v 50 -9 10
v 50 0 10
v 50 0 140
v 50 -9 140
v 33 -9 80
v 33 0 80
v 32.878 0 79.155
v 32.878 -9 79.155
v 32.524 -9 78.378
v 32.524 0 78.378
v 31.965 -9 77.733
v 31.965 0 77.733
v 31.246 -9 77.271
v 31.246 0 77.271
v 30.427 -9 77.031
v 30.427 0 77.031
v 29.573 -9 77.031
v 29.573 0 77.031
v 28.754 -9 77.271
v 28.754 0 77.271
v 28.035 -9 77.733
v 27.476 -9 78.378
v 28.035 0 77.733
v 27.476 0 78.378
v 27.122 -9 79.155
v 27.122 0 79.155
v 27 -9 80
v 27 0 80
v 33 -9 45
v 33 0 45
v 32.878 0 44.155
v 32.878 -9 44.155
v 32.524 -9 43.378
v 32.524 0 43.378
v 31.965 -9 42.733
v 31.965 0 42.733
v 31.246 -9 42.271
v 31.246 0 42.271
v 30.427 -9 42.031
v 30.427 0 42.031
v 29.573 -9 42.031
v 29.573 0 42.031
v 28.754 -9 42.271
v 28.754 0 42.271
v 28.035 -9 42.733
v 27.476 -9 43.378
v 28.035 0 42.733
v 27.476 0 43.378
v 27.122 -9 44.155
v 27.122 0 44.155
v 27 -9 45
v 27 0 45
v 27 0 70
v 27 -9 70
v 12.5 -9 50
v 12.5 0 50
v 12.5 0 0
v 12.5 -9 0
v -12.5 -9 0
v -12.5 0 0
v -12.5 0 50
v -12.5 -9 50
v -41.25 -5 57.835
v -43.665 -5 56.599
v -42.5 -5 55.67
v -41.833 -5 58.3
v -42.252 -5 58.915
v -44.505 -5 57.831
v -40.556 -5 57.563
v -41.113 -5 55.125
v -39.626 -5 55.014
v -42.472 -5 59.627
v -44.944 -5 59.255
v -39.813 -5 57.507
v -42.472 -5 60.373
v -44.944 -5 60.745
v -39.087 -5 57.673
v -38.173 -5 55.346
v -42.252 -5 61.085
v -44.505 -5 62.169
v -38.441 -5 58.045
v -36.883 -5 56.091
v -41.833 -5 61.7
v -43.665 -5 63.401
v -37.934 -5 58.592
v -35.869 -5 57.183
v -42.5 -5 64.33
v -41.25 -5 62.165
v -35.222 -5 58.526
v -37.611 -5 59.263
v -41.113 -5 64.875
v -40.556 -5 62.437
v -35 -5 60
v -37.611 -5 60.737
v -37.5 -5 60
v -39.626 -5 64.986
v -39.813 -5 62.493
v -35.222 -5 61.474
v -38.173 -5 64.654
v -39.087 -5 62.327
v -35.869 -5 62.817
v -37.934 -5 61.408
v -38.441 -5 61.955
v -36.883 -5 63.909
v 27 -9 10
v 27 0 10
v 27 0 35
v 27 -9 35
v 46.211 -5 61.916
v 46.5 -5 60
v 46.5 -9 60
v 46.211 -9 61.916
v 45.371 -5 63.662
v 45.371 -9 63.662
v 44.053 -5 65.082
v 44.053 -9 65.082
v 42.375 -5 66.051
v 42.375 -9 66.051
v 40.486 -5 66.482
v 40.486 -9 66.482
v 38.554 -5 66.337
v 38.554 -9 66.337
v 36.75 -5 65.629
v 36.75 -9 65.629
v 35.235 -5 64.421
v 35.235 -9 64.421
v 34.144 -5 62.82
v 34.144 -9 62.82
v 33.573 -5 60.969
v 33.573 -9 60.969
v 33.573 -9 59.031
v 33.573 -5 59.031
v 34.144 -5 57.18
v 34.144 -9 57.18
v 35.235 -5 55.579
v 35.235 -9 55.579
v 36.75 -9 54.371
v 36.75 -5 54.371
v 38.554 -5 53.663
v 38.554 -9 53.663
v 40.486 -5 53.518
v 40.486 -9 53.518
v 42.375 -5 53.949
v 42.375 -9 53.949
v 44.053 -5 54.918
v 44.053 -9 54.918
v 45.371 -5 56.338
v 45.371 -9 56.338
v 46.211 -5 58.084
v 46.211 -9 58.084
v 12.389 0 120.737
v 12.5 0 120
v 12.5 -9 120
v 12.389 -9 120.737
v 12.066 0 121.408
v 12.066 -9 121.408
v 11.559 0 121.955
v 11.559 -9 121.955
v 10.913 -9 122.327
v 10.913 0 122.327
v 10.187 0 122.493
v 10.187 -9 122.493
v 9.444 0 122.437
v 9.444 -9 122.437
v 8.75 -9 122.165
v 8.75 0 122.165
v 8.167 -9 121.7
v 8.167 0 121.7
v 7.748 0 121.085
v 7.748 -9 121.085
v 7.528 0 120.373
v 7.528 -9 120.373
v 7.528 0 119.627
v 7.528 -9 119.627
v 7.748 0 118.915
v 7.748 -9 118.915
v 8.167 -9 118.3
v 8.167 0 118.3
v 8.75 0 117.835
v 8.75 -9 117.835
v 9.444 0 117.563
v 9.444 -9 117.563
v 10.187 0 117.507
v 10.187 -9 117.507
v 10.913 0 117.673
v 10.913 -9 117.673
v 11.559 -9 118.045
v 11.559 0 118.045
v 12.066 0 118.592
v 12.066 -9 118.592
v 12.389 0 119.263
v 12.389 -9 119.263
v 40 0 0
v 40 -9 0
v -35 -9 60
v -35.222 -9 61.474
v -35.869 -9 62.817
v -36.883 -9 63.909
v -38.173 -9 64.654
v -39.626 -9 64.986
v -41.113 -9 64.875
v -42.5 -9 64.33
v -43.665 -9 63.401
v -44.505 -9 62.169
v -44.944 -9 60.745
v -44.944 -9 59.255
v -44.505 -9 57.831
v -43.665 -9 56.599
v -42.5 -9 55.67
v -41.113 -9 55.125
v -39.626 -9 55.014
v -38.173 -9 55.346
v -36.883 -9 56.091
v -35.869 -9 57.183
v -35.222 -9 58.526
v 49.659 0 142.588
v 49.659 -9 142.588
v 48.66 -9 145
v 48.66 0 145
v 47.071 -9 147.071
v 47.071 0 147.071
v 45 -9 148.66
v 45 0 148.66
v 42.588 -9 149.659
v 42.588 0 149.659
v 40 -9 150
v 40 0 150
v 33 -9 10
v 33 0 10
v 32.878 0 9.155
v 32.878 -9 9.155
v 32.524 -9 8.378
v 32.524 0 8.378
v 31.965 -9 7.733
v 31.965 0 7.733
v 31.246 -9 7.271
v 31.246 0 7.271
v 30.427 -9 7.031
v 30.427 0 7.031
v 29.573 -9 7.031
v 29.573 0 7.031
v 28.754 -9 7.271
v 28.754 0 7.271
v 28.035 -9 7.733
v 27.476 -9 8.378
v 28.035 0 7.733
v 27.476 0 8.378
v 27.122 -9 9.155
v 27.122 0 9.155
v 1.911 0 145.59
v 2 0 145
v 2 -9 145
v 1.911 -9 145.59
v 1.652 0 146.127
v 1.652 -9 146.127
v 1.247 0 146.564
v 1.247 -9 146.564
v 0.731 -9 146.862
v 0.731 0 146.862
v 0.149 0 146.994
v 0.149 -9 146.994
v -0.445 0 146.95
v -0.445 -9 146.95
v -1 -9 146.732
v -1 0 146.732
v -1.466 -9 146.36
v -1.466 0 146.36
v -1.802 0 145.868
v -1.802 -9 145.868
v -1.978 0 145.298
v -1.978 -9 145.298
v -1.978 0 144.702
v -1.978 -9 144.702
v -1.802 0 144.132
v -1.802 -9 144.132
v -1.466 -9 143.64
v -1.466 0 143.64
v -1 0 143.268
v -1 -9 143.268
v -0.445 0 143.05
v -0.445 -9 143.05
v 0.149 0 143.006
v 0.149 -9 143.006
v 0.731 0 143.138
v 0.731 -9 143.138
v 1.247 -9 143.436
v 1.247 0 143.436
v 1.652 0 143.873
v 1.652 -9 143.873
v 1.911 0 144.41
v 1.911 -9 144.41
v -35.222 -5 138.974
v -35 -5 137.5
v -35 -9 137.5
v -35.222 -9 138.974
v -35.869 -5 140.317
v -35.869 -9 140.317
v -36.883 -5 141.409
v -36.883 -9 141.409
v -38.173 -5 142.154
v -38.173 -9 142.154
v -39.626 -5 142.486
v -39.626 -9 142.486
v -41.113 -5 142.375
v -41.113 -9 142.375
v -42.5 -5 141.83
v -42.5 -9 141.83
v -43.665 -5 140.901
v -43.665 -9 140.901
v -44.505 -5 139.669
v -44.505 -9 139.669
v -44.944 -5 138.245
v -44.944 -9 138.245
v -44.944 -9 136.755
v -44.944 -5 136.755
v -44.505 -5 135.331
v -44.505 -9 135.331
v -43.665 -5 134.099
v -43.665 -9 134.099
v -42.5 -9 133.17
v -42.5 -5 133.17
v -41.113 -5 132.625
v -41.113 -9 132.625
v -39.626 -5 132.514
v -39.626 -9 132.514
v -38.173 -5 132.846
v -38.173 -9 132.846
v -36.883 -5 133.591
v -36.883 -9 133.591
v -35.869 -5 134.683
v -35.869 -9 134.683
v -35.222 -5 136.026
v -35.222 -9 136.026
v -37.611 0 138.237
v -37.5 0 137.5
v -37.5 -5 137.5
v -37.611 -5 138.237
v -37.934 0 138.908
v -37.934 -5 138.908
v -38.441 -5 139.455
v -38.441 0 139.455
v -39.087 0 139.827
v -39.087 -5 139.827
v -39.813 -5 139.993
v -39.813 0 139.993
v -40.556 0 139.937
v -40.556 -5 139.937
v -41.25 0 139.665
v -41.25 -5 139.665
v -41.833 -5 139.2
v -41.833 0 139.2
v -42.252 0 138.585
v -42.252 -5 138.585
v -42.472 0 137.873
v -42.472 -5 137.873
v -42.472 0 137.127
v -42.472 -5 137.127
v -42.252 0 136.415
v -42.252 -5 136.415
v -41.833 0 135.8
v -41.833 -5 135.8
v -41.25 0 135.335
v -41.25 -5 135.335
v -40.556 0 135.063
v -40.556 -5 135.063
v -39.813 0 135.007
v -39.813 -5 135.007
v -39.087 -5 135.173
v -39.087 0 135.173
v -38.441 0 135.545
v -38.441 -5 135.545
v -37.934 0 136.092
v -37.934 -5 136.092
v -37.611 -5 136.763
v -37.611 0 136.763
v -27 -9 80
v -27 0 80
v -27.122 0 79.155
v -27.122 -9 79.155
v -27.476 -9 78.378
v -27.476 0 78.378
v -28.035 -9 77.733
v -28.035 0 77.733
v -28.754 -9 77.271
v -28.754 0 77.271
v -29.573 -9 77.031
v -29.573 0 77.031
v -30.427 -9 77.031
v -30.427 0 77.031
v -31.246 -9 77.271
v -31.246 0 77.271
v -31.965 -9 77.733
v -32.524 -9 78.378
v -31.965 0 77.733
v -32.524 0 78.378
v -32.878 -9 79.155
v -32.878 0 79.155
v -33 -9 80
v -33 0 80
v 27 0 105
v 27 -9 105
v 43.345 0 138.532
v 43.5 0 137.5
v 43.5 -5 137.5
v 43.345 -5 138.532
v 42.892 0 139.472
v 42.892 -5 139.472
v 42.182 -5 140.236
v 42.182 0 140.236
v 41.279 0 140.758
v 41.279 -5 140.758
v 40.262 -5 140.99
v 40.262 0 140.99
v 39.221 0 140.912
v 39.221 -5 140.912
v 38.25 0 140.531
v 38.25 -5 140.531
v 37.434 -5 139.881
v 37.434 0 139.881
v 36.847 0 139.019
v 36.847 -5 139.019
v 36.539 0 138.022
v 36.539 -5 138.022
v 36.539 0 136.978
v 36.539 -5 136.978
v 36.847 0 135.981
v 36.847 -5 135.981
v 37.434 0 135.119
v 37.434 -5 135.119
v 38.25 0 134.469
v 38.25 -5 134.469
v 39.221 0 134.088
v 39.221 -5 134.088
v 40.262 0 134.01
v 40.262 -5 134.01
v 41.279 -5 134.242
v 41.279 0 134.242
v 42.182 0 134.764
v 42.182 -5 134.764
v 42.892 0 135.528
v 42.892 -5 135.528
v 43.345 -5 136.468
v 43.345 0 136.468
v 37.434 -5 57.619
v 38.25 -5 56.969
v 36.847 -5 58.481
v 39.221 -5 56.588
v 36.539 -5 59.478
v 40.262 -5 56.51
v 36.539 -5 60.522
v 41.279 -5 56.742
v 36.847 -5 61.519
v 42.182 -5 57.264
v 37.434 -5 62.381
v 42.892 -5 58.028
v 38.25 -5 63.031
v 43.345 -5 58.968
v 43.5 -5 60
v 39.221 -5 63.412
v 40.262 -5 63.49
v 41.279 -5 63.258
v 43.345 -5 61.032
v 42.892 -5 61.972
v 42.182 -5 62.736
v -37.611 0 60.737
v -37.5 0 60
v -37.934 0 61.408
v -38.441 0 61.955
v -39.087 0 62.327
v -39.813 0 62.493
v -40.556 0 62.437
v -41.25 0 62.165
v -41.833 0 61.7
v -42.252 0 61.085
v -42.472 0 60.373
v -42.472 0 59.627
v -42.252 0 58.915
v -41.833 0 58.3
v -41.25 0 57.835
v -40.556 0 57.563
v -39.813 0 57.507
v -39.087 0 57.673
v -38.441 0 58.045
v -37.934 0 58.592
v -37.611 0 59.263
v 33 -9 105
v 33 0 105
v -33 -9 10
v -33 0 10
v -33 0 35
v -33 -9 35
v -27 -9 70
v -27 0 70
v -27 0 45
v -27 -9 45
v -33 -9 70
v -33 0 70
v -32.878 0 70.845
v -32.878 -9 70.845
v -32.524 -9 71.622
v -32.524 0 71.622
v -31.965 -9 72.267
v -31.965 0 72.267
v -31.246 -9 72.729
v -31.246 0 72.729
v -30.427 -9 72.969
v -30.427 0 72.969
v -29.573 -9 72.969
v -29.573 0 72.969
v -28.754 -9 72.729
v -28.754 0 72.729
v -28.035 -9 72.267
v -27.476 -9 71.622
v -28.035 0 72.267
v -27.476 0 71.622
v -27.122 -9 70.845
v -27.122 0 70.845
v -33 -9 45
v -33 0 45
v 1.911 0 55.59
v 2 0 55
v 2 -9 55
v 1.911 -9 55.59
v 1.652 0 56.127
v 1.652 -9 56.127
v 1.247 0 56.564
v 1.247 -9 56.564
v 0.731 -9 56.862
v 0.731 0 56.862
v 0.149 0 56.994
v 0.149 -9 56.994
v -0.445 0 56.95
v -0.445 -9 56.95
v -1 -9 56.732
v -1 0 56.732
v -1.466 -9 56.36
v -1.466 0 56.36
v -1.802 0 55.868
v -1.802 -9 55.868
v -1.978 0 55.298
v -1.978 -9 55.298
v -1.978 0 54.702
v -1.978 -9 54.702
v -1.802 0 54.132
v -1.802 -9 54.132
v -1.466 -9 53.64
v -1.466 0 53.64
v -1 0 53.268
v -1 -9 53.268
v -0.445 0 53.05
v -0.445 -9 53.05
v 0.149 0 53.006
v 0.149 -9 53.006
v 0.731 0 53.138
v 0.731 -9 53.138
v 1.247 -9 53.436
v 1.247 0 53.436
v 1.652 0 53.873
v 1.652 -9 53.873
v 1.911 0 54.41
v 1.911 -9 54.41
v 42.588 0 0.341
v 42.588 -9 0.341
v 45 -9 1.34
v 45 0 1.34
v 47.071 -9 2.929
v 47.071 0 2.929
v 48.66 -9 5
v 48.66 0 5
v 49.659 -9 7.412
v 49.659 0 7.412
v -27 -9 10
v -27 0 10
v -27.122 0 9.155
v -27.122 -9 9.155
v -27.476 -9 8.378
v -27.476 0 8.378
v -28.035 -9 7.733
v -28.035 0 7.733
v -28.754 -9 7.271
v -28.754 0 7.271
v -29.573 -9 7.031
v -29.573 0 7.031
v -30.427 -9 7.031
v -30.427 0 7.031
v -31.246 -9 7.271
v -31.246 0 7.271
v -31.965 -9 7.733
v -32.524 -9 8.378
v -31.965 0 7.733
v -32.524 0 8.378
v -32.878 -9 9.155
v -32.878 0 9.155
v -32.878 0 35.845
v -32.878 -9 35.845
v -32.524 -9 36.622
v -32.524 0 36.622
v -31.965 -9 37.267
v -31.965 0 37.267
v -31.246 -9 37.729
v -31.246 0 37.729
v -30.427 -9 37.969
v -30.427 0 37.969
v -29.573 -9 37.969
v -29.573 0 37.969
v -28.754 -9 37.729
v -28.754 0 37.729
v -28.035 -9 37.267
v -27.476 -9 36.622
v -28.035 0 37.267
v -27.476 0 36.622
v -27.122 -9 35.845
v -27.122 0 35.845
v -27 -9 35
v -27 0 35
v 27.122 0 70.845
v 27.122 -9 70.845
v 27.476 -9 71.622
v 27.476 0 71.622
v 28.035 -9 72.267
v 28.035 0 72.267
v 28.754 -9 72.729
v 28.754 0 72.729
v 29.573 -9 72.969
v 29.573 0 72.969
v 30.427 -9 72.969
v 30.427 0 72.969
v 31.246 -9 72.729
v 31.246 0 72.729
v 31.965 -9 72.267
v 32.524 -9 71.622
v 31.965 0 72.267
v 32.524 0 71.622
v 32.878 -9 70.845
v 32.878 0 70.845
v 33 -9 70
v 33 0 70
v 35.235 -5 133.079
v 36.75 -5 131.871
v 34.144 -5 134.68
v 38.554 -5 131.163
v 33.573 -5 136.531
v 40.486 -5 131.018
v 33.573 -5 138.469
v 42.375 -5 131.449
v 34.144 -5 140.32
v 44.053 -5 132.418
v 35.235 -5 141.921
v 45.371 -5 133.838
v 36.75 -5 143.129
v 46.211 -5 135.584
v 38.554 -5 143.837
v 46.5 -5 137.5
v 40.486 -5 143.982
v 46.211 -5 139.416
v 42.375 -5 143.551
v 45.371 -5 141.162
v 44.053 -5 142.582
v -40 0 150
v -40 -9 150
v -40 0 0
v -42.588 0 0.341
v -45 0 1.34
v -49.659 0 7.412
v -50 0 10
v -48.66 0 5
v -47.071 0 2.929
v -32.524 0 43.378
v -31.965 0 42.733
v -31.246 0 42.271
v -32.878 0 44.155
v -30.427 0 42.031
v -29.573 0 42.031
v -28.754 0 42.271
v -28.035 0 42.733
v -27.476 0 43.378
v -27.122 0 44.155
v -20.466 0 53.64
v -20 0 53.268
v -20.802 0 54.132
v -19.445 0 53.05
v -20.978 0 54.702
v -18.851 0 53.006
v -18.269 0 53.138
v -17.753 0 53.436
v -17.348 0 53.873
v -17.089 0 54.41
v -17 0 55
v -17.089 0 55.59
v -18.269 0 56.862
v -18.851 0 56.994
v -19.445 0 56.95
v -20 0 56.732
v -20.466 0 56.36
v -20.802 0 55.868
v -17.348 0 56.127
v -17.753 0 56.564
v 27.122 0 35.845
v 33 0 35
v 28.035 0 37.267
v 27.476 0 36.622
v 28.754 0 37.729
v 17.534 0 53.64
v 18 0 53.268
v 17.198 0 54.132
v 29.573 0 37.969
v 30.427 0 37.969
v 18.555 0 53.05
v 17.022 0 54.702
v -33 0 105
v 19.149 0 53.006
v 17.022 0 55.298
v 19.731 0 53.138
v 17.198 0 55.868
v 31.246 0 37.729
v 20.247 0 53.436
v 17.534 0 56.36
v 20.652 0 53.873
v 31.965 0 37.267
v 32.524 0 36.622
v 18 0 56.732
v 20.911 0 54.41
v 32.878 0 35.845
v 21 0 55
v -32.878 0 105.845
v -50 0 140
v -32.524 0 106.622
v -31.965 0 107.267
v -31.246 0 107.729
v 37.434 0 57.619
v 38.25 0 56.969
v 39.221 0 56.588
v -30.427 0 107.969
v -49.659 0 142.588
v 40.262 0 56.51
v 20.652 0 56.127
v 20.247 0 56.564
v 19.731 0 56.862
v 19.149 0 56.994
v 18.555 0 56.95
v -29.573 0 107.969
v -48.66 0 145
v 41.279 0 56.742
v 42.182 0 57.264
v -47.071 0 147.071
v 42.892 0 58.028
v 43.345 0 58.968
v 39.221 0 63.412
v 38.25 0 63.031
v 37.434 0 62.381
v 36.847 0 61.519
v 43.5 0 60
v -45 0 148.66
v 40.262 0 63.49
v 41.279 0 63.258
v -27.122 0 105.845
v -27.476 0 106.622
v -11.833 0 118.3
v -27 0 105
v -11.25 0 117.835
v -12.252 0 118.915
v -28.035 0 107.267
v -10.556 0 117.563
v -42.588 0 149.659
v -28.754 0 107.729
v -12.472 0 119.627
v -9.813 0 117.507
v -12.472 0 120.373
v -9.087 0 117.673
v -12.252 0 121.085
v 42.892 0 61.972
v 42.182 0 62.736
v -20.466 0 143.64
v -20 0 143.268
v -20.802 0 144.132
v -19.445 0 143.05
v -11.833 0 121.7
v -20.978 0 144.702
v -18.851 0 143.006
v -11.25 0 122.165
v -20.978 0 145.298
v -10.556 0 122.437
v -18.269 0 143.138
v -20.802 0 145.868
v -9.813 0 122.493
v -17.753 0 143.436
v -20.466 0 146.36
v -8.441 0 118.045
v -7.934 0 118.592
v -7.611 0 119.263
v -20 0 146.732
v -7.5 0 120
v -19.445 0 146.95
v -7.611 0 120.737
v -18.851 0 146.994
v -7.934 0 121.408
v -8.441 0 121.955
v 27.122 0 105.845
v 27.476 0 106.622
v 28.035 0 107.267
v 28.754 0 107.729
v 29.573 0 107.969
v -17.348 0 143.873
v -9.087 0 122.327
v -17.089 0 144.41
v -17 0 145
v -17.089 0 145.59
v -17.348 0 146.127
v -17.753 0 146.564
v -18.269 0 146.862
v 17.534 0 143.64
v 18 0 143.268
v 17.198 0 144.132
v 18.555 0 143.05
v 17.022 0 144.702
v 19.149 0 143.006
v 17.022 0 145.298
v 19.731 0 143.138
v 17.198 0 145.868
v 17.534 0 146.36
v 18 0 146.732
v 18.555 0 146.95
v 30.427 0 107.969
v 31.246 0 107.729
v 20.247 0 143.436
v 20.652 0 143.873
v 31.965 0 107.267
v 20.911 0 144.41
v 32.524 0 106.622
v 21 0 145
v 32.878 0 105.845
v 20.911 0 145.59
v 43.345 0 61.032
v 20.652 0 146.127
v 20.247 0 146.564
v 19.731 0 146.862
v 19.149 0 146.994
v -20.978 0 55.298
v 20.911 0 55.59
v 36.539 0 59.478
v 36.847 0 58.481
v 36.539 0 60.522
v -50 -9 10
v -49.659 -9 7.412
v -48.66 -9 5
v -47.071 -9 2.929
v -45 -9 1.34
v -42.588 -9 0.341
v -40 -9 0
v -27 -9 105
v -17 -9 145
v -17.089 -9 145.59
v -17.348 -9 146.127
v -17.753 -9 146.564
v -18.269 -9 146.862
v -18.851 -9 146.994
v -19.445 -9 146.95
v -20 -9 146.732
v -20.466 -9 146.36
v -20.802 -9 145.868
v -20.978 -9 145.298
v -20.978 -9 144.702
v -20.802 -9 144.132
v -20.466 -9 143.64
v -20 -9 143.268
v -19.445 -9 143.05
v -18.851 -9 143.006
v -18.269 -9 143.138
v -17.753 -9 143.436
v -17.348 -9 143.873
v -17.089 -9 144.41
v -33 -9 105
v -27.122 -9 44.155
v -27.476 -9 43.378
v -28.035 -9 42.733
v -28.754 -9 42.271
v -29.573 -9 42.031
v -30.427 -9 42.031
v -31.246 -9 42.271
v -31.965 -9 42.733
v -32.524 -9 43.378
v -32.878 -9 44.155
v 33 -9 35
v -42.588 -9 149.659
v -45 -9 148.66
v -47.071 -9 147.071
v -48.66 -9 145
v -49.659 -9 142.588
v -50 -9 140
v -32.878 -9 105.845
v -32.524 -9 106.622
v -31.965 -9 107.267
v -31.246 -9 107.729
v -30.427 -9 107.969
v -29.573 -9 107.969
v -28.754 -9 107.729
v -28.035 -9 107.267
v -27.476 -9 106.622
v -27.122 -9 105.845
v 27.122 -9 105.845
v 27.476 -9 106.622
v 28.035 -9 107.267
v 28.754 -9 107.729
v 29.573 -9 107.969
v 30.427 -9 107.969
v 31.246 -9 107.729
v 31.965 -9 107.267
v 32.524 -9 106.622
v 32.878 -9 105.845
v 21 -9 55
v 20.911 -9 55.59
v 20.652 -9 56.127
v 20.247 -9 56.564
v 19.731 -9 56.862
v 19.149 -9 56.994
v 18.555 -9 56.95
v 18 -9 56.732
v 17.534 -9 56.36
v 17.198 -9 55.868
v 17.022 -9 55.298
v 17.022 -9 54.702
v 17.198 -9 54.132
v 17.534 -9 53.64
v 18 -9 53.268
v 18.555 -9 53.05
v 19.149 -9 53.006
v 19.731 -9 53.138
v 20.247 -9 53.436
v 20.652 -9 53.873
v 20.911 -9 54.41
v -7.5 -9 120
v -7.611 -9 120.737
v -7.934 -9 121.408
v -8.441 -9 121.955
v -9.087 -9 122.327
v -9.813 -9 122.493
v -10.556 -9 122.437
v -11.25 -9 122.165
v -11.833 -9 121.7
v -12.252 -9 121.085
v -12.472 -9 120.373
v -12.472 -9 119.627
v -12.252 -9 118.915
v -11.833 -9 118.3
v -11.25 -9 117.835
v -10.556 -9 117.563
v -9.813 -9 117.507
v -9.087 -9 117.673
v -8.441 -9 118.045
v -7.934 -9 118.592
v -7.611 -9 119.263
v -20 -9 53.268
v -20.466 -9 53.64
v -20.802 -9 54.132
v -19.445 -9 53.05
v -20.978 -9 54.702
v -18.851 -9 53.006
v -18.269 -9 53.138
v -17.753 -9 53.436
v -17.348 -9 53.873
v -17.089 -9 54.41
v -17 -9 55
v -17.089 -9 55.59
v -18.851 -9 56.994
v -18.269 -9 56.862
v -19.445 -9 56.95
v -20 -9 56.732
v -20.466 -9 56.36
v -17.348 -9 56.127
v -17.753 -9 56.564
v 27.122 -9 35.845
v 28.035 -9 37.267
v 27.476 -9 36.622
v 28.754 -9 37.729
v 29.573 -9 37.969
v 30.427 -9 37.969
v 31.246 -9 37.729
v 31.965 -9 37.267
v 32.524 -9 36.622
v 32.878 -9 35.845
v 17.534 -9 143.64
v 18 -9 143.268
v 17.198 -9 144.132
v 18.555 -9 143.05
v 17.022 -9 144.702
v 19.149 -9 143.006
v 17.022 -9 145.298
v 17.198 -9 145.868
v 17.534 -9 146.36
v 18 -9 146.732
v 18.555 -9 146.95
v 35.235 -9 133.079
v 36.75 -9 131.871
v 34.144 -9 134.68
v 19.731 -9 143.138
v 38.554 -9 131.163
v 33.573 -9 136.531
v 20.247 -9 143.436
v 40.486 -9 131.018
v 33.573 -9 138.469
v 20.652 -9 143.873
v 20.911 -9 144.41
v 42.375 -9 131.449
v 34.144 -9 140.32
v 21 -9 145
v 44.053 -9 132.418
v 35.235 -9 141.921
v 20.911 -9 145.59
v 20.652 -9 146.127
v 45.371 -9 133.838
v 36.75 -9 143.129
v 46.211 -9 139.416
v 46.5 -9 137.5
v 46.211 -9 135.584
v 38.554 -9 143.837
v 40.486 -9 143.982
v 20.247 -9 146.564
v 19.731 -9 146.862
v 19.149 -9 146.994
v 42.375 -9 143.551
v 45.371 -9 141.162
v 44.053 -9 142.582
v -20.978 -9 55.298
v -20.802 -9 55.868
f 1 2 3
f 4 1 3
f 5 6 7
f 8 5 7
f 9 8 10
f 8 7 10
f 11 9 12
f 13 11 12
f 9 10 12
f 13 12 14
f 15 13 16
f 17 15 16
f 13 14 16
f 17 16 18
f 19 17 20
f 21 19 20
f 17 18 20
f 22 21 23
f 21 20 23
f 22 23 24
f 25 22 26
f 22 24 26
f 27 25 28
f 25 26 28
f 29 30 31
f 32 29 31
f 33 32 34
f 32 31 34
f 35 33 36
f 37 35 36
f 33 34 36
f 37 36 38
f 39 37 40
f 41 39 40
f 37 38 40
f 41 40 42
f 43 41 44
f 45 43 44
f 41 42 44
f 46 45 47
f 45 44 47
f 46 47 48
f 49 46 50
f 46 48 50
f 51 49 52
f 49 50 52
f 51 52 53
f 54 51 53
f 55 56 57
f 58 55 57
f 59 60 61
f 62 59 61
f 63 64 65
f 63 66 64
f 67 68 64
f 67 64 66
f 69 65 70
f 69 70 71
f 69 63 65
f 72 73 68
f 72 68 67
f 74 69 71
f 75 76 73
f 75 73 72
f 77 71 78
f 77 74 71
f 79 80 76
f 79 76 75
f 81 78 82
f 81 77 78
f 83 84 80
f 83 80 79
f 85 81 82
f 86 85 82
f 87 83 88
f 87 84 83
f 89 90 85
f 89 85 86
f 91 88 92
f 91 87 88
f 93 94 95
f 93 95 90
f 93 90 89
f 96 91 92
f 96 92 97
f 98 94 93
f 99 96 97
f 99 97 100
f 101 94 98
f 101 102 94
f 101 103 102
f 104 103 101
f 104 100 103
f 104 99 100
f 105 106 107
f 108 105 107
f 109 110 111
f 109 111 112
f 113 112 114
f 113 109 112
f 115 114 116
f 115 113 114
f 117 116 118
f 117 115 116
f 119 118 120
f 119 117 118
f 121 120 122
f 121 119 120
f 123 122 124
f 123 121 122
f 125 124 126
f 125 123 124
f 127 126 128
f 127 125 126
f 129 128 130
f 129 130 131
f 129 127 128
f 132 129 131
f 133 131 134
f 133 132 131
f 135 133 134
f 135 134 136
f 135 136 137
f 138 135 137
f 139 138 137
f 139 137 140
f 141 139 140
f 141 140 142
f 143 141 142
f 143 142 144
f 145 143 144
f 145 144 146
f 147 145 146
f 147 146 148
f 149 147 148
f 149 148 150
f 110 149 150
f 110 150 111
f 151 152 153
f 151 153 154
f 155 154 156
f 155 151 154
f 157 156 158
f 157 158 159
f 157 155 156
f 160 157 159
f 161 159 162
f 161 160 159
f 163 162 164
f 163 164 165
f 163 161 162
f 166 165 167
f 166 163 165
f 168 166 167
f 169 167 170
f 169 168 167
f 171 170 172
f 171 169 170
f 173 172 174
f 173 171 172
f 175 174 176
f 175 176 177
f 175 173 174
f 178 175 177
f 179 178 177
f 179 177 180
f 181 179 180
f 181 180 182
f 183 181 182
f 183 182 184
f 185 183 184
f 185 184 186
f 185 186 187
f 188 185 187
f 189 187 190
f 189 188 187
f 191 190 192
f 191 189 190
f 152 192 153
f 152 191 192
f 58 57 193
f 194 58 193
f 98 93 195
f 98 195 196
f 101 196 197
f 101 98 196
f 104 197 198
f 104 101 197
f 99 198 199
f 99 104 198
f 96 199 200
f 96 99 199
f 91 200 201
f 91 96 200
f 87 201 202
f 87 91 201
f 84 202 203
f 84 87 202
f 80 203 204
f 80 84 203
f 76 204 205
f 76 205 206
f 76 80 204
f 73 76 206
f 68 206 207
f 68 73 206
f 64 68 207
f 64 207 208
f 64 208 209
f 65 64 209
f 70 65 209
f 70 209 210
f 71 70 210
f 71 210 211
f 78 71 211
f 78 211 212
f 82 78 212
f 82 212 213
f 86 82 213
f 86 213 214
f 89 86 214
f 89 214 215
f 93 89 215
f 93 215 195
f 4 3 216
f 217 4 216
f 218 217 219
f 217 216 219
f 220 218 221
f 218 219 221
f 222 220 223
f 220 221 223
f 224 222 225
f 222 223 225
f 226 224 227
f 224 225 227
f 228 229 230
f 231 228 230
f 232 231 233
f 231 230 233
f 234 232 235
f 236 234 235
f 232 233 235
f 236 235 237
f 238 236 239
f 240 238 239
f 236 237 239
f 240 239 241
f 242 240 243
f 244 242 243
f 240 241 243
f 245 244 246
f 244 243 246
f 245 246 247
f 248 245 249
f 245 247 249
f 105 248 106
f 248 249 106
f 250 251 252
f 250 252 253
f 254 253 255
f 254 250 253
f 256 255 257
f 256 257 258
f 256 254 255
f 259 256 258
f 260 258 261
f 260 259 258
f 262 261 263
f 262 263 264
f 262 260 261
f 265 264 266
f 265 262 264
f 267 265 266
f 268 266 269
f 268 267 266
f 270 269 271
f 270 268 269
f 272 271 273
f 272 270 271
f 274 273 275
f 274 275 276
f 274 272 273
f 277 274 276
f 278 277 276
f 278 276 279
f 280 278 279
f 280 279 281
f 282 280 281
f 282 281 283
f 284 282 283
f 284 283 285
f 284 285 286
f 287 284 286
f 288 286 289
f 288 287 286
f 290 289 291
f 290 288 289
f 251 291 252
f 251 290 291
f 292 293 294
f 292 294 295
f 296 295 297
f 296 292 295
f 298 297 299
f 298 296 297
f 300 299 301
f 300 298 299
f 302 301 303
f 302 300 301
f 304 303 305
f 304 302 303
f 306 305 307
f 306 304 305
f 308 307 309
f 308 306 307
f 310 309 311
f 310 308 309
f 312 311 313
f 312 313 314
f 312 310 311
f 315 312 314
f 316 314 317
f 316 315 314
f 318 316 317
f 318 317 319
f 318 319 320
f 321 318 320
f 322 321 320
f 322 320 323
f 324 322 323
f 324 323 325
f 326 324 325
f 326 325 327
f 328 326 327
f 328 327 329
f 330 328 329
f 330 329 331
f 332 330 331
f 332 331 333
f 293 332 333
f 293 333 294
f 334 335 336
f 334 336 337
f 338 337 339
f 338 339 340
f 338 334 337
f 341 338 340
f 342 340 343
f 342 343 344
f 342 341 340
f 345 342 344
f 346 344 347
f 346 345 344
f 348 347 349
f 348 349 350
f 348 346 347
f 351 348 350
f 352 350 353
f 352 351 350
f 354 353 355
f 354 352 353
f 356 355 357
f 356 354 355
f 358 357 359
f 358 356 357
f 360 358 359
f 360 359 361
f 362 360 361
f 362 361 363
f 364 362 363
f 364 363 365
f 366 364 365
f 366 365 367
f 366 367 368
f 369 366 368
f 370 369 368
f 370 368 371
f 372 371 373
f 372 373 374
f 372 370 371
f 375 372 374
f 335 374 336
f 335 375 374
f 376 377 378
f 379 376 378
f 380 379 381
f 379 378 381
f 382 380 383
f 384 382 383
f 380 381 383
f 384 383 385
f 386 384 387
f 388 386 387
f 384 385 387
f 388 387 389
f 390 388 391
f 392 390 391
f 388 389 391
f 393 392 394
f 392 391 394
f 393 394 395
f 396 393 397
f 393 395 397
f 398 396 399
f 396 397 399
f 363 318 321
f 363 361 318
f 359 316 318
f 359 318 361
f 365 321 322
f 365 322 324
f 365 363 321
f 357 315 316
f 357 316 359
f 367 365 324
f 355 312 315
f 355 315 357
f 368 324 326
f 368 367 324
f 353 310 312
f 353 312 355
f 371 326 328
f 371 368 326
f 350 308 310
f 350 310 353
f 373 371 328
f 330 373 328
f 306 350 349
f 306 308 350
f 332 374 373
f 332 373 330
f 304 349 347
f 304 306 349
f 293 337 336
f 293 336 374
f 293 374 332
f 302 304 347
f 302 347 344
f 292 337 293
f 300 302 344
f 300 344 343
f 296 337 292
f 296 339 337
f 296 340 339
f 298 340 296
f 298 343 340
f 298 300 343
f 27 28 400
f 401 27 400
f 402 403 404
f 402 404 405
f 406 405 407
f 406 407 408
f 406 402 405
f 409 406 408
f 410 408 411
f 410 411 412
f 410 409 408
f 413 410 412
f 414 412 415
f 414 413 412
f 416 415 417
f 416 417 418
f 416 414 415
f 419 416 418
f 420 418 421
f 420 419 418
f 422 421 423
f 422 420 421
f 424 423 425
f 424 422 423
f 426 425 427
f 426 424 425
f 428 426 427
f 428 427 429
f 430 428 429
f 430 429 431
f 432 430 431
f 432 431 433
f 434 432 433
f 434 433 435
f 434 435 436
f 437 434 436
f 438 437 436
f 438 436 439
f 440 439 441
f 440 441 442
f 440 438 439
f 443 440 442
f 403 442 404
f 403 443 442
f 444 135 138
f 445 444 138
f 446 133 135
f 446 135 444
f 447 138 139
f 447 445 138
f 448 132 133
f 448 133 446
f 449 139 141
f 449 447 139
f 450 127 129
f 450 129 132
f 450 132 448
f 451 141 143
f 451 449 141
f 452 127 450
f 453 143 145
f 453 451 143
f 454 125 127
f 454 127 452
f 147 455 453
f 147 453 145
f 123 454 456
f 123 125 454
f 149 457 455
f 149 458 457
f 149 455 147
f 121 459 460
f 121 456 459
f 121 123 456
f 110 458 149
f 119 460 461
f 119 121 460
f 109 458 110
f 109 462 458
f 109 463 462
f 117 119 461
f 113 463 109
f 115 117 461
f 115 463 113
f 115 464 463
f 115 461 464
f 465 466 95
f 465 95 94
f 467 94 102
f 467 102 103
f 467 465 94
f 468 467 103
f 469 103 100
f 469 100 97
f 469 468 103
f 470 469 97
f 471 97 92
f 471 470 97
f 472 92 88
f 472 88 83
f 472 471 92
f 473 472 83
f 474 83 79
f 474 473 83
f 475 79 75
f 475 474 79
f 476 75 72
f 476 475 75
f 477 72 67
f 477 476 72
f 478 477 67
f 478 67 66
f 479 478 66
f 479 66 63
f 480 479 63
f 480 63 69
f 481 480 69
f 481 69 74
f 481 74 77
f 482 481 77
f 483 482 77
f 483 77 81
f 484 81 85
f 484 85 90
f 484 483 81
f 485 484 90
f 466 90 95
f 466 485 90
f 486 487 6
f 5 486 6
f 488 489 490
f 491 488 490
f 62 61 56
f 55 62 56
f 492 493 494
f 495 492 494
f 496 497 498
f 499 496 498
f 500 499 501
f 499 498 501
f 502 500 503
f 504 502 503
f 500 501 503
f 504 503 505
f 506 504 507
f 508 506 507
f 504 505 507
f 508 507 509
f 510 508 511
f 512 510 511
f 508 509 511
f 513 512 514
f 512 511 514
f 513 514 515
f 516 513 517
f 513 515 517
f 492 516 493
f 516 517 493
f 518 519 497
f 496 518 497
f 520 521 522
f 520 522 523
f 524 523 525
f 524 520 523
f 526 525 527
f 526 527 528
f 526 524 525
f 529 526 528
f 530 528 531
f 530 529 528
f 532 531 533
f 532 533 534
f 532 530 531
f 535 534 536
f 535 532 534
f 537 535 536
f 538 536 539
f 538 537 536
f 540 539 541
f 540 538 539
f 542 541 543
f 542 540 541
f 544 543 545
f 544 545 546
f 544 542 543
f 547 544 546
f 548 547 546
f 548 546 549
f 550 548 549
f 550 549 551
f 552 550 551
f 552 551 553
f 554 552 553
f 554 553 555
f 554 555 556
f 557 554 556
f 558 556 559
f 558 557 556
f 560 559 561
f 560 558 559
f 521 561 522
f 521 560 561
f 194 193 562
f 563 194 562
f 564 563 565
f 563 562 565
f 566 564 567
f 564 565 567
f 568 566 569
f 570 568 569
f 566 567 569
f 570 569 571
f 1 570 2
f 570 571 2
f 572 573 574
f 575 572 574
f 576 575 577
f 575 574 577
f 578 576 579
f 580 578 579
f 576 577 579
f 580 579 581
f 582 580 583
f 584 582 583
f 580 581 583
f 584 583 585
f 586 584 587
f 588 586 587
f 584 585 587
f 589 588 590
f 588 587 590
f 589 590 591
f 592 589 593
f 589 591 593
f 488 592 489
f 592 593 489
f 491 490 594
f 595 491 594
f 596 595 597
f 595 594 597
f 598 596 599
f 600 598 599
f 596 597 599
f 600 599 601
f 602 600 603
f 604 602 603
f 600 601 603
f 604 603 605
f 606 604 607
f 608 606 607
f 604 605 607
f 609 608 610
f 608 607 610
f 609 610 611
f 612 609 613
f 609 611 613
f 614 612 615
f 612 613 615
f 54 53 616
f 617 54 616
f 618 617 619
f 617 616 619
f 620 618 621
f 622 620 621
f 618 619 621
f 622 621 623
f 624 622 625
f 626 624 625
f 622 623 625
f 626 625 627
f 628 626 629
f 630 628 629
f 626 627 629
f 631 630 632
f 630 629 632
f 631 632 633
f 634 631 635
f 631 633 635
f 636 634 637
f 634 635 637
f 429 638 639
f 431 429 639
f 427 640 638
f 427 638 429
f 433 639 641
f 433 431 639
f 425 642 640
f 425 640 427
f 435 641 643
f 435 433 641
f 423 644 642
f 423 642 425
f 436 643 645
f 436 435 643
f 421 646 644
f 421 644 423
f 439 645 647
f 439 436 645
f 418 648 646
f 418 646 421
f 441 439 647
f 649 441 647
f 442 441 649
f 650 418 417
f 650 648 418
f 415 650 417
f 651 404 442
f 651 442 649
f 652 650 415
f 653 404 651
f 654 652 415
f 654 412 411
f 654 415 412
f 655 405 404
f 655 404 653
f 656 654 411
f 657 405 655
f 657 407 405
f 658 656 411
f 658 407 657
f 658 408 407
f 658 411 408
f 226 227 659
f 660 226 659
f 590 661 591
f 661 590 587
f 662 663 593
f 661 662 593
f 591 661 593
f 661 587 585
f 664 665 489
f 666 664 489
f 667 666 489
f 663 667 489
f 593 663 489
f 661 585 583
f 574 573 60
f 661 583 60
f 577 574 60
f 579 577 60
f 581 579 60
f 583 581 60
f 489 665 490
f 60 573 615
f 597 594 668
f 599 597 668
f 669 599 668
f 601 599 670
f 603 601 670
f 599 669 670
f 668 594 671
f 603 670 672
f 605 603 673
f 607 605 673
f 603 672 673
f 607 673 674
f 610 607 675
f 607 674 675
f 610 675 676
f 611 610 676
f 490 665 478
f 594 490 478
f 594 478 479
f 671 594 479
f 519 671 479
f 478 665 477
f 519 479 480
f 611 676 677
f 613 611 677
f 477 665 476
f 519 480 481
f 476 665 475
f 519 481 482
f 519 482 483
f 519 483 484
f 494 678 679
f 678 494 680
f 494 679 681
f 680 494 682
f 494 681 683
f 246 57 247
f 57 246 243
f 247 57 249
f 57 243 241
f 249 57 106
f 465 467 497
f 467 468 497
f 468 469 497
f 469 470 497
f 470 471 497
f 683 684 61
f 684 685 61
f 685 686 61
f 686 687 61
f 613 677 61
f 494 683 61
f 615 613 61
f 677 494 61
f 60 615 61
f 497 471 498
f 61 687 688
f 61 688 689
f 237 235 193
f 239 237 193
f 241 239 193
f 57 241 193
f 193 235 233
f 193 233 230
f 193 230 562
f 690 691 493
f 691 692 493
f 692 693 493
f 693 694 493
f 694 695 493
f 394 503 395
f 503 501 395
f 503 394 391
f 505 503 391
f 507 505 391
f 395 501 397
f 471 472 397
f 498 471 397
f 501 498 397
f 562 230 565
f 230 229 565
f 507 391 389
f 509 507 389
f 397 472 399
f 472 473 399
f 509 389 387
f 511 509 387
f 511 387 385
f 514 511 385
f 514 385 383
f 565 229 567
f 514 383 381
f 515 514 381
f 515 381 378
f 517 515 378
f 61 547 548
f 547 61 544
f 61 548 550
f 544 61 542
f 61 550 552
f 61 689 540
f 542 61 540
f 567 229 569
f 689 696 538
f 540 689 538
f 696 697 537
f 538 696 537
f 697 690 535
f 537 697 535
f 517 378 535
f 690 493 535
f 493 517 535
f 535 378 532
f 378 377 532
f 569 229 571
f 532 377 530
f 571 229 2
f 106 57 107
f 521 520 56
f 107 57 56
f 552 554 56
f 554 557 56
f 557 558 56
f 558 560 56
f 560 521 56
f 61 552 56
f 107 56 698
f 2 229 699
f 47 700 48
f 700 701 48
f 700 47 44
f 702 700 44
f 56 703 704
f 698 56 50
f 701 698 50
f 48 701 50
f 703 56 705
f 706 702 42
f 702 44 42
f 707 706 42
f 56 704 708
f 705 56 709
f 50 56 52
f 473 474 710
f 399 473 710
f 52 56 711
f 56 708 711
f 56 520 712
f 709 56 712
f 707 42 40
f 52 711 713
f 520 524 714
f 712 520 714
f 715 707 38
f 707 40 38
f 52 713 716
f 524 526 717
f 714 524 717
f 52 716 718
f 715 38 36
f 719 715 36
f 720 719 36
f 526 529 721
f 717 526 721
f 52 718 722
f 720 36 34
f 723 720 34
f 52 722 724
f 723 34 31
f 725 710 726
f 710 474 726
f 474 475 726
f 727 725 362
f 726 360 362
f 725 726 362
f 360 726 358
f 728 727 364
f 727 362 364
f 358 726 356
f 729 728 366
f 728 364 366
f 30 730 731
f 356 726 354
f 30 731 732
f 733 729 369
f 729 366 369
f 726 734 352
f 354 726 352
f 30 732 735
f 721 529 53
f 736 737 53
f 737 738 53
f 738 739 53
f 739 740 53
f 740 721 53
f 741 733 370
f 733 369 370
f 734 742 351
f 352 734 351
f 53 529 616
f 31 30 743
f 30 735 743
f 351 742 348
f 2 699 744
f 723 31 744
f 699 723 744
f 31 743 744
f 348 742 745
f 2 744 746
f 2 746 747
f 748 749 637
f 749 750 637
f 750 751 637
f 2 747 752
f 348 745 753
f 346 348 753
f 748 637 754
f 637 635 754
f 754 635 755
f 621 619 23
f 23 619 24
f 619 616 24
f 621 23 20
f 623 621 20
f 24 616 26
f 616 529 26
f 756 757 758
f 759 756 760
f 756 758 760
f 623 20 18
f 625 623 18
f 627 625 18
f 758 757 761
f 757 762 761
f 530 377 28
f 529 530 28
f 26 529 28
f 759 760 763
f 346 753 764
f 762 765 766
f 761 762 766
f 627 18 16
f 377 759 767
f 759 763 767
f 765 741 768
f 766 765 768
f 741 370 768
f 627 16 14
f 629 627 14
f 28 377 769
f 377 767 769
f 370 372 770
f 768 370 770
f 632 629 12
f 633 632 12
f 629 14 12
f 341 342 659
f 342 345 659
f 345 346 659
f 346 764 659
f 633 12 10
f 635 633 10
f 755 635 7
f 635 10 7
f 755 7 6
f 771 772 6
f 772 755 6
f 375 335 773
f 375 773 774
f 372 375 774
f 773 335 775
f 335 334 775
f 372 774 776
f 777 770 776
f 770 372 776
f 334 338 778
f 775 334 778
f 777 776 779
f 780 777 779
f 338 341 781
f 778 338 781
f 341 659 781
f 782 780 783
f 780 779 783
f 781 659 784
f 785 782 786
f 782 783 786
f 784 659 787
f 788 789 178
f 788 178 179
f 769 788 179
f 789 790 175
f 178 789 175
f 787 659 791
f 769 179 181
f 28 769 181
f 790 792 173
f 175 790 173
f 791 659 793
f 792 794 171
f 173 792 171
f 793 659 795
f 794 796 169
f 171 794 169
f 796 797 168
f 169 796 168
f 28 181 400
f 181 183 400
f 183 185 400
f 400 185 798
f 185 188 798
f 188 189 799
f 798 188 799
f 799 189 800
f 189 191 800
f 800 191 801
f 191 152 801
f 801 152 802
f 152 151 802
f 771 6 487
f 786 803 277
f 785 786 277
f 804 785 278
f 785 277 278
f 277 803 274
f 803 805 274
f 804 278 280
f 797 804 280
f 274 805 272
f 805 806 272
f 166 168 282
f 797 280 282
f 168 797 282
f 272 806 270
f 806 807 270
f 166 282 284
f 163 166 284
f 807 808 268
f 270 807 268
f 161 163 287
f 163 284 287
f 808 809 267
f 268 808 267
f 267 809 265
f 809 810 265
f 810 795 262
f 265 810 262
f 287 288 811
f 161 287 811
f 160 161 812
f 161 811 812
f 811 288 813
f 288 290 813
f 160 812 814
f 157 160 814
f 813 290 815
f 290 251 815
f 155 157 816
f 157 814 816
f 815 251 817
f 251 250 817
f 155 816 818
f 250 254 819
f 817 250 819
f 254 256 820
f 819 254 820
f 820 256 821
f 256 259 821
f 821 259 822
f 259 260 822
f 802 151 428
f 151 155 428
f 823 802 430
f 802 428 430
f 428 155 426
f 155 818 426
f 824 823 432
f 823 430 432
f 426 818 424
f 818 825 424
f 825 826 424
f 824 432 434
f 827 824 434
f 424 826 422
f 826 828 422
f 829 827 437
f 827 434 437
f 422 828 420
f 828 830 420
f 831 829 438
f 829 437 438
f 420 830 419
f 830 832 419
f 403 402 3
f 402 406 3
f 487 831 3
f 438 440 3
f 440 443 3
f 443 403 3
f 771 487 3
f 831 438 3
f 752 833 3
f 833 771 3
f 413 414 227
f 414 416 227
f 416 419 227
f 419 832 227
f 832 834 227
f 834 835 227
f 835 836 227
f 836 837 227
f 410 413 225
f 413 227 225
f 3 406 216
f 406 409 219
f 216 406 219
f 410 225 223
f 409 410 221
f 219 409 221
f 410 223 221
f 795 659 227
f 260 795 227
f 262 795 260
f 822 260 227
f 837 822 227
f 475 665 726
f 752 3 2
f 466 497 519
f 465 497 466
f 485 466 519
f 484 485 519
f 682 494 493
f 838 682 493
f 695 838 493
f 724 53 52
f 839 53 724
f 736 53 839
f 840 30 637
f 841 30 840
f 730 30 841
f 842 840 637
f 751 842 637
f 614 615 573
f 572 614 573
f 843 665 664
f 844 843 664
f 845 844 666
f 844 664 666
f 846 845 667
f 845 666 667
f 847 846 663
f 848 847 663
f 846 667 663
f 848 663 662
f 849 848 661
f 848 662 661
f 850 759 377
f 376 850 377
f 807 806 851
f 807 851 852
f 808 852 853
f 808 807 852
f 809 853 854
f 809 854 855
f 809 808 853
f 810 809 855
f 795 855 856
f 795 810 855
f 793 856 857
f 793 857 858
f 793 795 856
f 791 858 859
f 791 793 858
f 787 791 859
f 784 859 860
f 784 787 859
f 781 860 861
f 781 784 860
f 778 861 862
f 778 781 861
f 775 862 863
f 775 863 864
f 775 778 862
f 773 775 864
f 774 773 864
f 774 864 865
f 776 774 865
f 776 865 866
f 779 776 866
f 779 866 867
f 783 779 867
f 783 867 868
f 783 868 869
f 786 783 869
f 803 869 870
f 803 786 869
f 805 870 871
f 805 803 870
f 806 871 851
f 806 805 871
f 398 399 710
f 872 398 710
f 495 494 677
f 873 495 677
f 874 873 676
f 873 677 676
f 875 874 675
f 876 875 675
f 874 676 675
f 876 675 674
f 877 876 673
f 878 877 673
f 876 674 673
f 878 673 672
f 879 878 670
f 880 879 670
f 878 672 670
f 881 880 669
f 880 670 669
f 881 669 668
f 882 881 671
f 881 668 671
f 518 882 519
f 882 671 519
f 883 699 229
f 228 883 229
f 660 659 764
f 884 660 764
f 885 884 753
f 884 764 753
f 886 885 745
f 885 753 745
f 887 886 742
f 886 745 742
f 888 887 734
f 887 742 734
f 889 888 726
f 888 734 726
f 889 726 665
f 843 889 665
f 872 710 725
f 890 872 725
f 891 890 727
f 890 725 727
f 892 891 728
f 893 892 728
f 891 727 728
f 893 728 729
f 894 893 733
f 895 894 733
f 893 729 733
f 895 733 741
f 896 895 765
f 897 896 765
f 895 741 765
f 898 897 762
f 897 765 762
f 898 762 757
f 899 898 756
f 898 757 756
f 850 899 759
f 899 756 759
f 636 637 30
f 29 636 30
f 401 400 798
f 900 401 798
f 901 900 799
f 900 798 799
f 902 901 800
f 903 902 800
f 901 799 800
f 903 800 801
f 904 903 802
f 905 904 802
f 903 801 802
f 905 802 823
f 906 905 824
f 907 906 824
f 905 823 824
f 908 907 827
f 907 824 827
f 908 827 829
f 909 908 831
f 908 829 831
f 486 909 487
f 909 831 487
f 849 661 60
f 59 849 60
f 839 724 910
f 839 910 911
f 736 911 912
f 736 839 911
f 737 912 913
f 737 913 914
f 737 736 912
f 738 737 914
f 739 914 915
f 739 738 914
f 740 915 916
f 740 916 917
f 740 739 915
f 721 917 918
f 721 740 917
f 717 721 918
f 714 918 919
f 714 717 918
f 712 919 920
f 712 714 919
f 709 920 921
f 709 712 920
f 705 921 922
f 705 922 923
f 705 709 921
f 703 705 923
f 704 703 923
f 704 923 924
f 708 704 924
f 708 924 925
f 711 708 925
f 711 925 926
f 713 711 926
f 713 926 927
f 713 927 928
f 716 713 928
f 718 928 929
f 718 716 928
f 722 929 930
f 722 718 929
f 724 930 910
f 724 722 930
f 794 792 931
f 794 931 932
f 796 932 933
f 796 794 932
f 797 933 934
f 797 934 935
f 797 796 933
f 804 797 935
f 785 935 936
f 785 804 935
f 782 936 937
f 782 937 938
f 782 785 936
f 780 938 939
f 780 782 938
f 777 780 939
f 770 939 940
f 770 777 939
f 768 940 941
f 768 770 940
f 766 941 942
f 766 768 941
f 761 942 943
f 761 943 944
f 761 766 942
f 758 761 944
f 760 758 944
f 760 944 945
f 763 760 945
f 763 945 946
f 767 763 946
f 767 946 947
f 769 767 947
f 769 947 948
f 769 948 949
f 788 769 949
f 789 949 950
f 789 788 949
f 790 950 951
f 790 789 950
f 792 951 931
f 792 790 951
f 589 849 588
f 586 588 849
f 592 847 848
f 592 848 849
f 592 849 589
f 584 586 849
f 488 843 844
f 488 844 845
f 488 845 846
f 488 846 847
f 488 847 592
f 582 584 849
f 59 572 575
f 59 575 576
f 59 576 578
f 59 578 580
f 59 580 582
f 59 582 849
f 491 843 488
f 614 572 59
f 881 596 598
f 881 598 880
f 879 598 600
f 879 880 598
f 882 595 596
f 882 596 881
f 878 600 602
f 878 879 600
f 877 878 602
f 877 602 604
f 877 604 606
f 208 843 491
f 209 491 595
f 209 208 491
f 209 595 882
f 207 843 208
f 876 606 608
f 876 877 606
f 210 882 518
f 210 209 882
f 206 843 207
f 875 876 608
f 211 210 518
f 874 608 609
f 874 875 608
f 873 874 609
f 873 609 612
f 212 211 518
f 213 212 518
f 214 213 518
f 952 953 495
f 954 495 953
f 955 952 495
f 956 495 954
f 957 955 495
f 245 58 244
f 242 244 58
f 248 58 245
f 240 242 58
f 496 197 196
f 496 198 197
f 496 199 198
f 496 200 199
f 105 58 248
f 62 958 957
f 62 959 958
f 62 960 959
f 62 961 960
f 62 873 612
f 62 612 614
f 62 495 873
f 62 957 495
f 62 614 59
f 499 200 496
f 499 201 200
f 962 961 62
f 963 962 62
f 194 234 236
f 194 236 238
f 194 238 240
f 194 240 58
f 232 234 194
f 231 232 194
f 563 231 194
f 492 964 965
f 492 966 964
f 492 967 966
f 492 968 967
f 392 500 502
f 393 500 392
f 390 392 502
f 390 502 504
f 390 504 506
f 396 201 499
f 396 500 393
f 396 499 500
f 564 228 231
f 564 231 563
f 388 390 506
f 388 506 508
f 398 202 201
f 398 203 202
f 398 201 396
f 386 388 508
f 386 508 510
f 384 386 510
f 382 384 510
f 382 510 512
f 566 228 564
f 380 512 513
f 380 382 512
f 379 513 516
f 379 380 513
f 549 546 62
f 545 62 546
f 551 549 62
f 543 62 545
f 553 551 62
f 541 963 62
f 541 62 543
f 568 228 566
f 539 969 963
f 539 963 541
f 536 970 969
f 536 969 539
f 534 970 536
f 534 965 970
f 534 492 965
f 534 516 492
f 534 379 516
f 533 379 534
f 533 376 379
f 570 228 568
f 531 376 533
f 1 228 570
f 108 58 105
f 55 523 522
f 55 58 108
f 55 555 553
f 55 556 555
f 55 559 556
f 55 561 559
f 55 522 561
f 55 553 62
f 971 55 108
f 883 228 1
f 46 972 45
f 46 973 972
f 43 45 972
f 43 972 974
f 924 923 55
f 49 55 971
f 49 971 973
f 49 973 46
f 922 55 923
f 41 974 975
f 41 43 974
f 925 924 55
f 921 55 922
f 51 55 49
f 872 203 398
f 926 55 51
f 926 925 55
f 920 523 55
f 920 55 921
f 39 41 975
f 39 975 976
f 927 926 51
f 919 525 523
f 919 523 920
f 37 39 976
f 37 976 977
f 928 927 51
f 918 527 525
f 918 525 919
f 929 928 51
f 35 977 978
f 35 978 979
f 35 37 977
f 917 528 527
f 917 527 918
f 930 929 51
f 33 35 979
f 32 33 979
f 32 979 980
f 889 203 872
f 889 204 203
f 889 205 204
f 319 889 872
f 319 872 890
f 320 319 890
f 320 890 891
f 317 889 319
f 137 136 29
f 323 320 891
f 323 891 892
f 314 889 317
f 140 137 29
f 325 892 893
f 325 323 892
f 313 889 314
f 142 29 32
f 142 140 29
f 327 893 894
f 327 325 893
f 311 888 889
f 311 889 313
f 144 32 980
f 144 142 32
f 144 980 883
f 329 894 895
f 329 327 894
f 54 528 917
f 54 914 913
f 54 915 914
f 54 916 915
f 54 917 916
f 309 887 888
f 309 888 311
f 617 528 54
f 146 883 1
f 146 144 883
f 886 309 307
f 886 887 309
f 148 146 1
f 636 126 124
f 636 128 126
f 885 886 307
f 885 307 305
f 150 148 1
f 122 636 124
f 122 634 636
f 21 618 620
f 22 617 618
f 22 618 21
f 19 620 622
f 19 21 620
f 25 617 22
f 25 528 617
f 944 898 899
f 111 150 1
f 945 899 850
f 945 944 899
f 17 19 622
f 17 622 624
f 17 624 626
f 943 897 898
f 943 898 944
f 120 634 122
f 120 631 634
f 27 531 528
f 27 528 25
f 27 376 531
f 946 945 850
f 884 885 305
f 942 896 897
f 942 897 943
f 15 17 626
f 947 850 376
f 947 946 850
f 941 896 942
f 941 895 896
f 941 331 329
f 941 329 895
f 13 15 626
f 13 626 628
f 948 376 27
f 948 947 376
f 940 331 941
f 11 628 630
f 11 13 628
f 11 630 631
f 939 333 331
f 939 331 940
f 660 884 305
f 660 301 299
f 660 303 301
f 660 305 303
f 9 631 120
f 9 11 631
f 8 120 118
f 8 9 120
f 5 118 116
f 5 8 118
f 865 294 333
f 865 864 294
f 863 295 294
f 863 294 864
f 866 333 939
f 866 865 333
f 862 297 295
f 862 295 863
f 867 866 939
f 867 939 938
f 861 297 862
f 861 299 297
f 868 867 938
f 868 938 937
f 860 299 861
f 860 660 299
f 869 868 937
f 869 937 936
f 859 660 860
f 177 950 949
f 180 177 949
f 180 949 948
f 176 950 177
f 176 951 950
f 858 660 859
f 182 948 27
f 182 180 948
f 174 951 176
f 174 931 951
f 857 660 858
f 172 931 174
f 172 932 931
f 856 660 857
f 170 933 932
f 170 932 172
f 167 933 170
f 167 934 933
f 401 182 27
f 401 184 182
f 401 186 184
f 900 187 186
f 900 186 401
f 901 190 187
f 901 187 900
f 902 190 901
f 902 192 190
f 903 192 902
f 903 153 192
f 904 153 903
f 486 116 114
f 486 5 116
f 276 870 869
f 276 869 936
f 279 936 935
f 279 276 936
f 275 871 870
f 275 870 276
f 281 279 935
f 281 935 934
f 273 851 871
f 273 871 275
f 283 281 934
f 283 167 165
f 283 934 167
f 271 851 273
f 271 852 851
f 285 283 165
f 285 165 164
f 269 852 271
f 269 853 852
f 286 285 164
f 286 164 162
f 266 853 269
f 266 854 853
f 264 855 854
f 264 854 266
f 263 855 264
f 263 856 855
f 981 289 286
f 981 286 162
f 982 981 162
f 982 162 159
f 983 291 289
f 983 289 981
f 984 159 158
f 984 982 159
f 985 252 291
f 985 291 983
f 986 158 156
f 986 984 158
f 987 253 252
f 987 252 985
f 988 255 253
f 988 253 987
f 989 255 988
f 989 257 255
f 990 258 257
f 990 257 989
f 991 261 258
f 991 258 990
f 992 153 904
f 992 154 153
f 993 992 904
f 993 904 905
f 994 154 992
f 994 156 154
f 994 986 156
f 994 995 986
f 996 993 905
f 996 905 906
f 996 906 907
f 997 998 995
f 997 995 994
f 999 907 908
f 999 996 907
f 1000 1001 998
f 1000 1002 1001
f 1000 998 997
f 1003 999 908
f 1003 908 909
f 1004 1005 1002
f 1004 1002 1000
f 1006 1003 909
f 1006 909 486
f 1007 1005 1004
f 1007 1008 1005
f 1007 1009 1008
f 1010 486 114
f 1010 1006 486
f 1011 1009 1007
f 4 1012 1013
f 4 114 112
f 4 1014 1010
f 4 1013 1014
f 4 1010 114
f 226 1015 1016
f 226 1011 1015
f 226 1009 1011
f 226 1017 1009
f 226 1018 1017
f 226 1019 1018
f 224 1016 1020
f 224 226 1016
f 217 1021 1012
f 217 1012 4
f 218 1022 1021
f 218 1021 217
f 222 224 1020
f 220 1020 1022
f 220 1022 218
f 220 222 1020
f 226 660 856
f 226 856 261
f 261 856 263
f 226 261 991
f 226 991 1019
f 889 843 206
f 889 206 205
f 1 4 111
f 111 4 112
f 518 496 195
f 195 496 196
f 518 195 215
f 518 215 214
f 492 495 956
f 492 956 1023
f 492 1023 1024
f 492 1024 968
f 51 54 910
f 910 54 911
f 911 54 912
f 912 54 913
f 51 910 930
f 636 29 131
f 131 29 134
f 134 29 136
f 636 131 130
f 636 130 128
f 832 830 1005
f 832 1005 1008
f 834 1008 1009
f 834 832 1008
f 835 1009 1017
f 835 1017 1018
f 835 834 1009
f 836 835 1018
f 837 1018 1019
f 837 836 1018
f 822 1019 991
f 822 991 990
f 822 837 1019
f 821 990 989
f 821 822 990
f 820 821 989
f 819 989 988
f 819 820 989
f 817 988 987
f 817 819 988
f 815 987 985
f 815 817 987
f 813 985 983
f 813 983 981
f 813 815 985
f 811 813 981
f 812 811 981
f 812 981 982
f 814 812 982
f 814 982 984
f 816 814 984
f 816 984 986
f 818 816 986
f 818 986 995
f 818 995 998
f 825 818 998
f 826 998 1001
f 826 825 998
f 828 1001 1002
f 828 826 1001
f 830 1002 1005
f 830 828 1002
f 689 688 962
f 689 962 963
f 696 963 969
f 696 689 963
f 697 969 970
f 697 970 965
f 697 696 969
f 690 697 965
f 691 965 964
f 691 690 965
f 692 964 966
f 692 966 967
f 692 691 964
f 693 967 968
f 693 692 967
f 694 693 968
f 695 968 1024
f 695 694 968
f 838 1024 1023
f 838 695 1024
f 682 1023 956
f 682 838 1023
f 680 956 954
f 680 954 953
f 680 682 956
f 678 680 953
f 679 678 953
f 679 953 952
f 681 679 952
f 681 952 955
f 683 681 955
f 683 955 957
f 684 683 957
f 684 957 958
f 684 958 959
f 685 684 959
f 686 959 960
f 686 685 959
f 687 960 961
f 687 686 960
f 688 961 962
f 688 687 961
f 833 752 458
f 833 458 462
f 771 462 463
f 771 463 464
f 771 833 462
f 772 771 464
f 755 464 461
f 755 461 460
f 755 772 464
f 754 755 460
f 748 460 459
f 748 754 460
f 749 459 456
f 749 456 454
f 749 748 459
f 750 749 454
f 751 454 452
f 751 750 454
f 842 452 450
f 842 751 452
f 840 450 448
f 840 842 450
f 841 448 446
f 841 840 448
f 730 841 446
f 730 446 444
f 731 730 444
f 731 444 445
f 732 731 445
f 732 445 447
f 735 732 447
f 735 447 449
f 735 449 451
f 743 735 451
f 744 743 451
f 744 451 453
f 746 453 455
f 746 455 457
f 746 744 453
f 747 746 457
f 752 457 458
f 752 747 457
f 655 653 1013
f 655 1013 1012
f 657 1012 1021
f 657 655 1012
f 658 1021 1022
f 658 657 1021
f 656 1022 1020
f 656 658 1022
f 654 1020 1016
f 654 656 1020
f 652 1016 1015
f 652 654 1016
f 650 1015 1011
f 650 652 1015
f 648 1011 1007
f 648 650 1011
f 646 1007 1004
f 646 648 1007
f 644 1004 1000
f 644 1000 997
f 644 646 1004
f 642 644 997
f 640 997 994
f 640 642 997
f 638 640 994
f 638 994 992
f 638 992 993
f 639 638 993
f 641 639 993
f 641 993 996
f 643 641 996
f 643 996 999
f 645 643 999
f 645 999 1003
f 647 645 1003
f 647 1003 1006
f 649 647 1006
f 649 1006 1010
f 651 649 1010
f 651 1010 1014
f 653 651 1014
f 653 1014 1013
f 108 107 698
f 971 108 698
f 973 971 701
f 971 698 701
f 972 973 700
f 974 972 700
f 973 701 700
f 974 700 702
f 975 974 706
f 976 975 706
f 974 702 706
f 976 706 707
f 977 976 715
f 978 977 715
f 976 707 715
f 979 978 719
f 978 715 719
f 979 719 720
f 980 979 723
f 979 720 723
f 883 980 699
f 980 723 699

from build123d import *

# Parameters (mm, degrees)
F0_R     = 5
F0_R_2   = 2
F0_R_3   = 6.5
F0_R_4   = 2.5
F1_DEPTH = 9
F0_R_5   = 3.5
F2_DEPTH = 5


with BuildPart() as f1:
    # F0 (on Front) → F1 (new body)
    with BuildSketch(Plane.XZ):
        with BuildLine():
            Line((40, 150), (-40, 150))
            ThreePointArc((-40, 150), (-47.071068, 147.071068), (-50, 140))
            Line((-50, 140), (-50, 10))
            ThreePointArc((-50, 10), (-47.071068, 2.928932), (-40, 0))
            Line((-40, 0), (-12.5, 0))
            Line((-12.5, 0), (-12.5, 50))
            Line((-12.5, 50), (0, 50))
            Line((0, 50), (12.5, 50))
            Line((12.5, 50), (12.5, 0))
            Line((12.5, 0), (40, 0))
            ThreePointArc((40, 0), (47.071068, 2.928932), (50, 10))
            Line((50, 10), (50, 140))
            ThreePointArc((50, 140), (47.071068, 147.071068), (40, 150))
        make_face()
        with BuildLine():
            ThreePointArc((-27, 10), (-30, 7), (-33, 10))
            Line((-33, 10), (-33, 35))
            ThreePointArc((-33, 35), (-30, 38), (-27, 35))
            Line((-27, 35), (-27, 10))
        make_face(mode=Mode.SUBTRACT)
        with Locations((-40, 60)):
            Circle(F0_R, mode=Mode.SUBTRACT)
        with BuildLine():
            Line((-33, 45), (-33, 70))
            ThreePointArc((-33, 70), (-30, 73), (-27, 70))
            Line((-27, 70), (-27, 45))
            ThreePointArc((-27, 45), (-30, 42), (-33, 45))
        make_face(mode=Mode.SUBTRACT)
        with Locations((-19, 55)):
            Circle(F0_R_2, mode=Mode.SUBTRACT)
        with BuildLine():
            Line((27, 10), (27, 35))
            ThreePointArc((27, 35), (30, 38), (33, 35))
            Line((33, 35), (33, 10))
            ThreePointArc((33, 10), (30, 7), (27, 10))
        make_face(mode=Mode.SUBTRACT)
        with Locations((0, 55)):
            Circle(F0_R_2, mode=Mode.SUBTRACT)
        with Locations((19, 55)):
            Circle(F0_R_2, mode=Mode.SUBTRACT)
        with BuildLine():
            ThreePointArc((27, 70), (30, 73), (33, 70))
            Line((33, 70), (33, 45))
            ThreePointArc((33, 45), (30, 42), (27, 45))
            Line((27, 45), (27, 70))
        make_face(mode=Mode.SUBTRACT)
        with Locations((40, 60)):
            Circle(F0_R_3, mode=Mode.SUBTRACT)
        with BuildLine():
            ThreePointArc((-27, 80), (-30, 77), (-33, 80))
            Line((-33, 80), (-33, 105))
            ThreePointArc((-33, 105), (-30, 108), (-27, 105))
            Line((-27, 105), (-27, 80))
        make_face(mode=Mode.SUBTRACT)
        with Locations((-40, 137.5)):
            Circle(F0_R, mode=Mode.SUBTRACT)
        with Locations((-10, 120)):
            Circle(F0_R_4, mode=Mode.SUBTRACT)
        with Locations((-19, 145)):
            Circle(F0_R_2, mode=Mode.SUBTRACT)
        with BuildLine():
            Line((33, 105), (33, 80))
            ThreePointArc((33, 80), (30, 77), (27, 80))
            Line((27, 80), (27, 105))
            ThreePointArc((27, 105), (30, 108), (33, 105))
        make_face(mode=Mode.SUBTRACT)
        with Locations((10, 120)):
            Circle(F0_R_4, mode=Mode.SUBTRACT)
        with Locations((0, 145)):
            Circle(F0_R_2, mode=Mode.SUBTRACT)
        with Locations((19, 145)):
            Circle(F0_R_2, mode=Mode.SUBTRACT)
        with Locations((40, 137.5)):
            Circle(F0_R_3, mode=Mode.SUBTRACT)
    extrude(amount=F1_DEPTH)

    # F0 (on Front) → F2 (join)
    with BuildSketch(Plane.XZ):
        with Locations((-40, 137.5)):
            Circle(F0_R)
        with Locations((-40, 137.5)):
            Circle(F0_R_4, mode=Mode.SUBTRACT)
        with Locations((40, 137.5)):
            Circle(F0_R_3)
        with Locations((40, 137.5)):
            Circle(F0_R_5, mode=Mode.SUBTRACT)
        with Locations((40, 60)):
            Circle(F0_R_3)
        with Locations((40, 60)):
            Circle(F0_R_5, mode=Mode.SUBTRACT)
        with Locations((-40, 60)):
            Circle(F0_R)
        with Locations((-40, 60)):
            Circle(F0_R_4, mode=Mode.SUBTRACT)
    extrude(amount=F2_DEPTH)


solid = f1.part
